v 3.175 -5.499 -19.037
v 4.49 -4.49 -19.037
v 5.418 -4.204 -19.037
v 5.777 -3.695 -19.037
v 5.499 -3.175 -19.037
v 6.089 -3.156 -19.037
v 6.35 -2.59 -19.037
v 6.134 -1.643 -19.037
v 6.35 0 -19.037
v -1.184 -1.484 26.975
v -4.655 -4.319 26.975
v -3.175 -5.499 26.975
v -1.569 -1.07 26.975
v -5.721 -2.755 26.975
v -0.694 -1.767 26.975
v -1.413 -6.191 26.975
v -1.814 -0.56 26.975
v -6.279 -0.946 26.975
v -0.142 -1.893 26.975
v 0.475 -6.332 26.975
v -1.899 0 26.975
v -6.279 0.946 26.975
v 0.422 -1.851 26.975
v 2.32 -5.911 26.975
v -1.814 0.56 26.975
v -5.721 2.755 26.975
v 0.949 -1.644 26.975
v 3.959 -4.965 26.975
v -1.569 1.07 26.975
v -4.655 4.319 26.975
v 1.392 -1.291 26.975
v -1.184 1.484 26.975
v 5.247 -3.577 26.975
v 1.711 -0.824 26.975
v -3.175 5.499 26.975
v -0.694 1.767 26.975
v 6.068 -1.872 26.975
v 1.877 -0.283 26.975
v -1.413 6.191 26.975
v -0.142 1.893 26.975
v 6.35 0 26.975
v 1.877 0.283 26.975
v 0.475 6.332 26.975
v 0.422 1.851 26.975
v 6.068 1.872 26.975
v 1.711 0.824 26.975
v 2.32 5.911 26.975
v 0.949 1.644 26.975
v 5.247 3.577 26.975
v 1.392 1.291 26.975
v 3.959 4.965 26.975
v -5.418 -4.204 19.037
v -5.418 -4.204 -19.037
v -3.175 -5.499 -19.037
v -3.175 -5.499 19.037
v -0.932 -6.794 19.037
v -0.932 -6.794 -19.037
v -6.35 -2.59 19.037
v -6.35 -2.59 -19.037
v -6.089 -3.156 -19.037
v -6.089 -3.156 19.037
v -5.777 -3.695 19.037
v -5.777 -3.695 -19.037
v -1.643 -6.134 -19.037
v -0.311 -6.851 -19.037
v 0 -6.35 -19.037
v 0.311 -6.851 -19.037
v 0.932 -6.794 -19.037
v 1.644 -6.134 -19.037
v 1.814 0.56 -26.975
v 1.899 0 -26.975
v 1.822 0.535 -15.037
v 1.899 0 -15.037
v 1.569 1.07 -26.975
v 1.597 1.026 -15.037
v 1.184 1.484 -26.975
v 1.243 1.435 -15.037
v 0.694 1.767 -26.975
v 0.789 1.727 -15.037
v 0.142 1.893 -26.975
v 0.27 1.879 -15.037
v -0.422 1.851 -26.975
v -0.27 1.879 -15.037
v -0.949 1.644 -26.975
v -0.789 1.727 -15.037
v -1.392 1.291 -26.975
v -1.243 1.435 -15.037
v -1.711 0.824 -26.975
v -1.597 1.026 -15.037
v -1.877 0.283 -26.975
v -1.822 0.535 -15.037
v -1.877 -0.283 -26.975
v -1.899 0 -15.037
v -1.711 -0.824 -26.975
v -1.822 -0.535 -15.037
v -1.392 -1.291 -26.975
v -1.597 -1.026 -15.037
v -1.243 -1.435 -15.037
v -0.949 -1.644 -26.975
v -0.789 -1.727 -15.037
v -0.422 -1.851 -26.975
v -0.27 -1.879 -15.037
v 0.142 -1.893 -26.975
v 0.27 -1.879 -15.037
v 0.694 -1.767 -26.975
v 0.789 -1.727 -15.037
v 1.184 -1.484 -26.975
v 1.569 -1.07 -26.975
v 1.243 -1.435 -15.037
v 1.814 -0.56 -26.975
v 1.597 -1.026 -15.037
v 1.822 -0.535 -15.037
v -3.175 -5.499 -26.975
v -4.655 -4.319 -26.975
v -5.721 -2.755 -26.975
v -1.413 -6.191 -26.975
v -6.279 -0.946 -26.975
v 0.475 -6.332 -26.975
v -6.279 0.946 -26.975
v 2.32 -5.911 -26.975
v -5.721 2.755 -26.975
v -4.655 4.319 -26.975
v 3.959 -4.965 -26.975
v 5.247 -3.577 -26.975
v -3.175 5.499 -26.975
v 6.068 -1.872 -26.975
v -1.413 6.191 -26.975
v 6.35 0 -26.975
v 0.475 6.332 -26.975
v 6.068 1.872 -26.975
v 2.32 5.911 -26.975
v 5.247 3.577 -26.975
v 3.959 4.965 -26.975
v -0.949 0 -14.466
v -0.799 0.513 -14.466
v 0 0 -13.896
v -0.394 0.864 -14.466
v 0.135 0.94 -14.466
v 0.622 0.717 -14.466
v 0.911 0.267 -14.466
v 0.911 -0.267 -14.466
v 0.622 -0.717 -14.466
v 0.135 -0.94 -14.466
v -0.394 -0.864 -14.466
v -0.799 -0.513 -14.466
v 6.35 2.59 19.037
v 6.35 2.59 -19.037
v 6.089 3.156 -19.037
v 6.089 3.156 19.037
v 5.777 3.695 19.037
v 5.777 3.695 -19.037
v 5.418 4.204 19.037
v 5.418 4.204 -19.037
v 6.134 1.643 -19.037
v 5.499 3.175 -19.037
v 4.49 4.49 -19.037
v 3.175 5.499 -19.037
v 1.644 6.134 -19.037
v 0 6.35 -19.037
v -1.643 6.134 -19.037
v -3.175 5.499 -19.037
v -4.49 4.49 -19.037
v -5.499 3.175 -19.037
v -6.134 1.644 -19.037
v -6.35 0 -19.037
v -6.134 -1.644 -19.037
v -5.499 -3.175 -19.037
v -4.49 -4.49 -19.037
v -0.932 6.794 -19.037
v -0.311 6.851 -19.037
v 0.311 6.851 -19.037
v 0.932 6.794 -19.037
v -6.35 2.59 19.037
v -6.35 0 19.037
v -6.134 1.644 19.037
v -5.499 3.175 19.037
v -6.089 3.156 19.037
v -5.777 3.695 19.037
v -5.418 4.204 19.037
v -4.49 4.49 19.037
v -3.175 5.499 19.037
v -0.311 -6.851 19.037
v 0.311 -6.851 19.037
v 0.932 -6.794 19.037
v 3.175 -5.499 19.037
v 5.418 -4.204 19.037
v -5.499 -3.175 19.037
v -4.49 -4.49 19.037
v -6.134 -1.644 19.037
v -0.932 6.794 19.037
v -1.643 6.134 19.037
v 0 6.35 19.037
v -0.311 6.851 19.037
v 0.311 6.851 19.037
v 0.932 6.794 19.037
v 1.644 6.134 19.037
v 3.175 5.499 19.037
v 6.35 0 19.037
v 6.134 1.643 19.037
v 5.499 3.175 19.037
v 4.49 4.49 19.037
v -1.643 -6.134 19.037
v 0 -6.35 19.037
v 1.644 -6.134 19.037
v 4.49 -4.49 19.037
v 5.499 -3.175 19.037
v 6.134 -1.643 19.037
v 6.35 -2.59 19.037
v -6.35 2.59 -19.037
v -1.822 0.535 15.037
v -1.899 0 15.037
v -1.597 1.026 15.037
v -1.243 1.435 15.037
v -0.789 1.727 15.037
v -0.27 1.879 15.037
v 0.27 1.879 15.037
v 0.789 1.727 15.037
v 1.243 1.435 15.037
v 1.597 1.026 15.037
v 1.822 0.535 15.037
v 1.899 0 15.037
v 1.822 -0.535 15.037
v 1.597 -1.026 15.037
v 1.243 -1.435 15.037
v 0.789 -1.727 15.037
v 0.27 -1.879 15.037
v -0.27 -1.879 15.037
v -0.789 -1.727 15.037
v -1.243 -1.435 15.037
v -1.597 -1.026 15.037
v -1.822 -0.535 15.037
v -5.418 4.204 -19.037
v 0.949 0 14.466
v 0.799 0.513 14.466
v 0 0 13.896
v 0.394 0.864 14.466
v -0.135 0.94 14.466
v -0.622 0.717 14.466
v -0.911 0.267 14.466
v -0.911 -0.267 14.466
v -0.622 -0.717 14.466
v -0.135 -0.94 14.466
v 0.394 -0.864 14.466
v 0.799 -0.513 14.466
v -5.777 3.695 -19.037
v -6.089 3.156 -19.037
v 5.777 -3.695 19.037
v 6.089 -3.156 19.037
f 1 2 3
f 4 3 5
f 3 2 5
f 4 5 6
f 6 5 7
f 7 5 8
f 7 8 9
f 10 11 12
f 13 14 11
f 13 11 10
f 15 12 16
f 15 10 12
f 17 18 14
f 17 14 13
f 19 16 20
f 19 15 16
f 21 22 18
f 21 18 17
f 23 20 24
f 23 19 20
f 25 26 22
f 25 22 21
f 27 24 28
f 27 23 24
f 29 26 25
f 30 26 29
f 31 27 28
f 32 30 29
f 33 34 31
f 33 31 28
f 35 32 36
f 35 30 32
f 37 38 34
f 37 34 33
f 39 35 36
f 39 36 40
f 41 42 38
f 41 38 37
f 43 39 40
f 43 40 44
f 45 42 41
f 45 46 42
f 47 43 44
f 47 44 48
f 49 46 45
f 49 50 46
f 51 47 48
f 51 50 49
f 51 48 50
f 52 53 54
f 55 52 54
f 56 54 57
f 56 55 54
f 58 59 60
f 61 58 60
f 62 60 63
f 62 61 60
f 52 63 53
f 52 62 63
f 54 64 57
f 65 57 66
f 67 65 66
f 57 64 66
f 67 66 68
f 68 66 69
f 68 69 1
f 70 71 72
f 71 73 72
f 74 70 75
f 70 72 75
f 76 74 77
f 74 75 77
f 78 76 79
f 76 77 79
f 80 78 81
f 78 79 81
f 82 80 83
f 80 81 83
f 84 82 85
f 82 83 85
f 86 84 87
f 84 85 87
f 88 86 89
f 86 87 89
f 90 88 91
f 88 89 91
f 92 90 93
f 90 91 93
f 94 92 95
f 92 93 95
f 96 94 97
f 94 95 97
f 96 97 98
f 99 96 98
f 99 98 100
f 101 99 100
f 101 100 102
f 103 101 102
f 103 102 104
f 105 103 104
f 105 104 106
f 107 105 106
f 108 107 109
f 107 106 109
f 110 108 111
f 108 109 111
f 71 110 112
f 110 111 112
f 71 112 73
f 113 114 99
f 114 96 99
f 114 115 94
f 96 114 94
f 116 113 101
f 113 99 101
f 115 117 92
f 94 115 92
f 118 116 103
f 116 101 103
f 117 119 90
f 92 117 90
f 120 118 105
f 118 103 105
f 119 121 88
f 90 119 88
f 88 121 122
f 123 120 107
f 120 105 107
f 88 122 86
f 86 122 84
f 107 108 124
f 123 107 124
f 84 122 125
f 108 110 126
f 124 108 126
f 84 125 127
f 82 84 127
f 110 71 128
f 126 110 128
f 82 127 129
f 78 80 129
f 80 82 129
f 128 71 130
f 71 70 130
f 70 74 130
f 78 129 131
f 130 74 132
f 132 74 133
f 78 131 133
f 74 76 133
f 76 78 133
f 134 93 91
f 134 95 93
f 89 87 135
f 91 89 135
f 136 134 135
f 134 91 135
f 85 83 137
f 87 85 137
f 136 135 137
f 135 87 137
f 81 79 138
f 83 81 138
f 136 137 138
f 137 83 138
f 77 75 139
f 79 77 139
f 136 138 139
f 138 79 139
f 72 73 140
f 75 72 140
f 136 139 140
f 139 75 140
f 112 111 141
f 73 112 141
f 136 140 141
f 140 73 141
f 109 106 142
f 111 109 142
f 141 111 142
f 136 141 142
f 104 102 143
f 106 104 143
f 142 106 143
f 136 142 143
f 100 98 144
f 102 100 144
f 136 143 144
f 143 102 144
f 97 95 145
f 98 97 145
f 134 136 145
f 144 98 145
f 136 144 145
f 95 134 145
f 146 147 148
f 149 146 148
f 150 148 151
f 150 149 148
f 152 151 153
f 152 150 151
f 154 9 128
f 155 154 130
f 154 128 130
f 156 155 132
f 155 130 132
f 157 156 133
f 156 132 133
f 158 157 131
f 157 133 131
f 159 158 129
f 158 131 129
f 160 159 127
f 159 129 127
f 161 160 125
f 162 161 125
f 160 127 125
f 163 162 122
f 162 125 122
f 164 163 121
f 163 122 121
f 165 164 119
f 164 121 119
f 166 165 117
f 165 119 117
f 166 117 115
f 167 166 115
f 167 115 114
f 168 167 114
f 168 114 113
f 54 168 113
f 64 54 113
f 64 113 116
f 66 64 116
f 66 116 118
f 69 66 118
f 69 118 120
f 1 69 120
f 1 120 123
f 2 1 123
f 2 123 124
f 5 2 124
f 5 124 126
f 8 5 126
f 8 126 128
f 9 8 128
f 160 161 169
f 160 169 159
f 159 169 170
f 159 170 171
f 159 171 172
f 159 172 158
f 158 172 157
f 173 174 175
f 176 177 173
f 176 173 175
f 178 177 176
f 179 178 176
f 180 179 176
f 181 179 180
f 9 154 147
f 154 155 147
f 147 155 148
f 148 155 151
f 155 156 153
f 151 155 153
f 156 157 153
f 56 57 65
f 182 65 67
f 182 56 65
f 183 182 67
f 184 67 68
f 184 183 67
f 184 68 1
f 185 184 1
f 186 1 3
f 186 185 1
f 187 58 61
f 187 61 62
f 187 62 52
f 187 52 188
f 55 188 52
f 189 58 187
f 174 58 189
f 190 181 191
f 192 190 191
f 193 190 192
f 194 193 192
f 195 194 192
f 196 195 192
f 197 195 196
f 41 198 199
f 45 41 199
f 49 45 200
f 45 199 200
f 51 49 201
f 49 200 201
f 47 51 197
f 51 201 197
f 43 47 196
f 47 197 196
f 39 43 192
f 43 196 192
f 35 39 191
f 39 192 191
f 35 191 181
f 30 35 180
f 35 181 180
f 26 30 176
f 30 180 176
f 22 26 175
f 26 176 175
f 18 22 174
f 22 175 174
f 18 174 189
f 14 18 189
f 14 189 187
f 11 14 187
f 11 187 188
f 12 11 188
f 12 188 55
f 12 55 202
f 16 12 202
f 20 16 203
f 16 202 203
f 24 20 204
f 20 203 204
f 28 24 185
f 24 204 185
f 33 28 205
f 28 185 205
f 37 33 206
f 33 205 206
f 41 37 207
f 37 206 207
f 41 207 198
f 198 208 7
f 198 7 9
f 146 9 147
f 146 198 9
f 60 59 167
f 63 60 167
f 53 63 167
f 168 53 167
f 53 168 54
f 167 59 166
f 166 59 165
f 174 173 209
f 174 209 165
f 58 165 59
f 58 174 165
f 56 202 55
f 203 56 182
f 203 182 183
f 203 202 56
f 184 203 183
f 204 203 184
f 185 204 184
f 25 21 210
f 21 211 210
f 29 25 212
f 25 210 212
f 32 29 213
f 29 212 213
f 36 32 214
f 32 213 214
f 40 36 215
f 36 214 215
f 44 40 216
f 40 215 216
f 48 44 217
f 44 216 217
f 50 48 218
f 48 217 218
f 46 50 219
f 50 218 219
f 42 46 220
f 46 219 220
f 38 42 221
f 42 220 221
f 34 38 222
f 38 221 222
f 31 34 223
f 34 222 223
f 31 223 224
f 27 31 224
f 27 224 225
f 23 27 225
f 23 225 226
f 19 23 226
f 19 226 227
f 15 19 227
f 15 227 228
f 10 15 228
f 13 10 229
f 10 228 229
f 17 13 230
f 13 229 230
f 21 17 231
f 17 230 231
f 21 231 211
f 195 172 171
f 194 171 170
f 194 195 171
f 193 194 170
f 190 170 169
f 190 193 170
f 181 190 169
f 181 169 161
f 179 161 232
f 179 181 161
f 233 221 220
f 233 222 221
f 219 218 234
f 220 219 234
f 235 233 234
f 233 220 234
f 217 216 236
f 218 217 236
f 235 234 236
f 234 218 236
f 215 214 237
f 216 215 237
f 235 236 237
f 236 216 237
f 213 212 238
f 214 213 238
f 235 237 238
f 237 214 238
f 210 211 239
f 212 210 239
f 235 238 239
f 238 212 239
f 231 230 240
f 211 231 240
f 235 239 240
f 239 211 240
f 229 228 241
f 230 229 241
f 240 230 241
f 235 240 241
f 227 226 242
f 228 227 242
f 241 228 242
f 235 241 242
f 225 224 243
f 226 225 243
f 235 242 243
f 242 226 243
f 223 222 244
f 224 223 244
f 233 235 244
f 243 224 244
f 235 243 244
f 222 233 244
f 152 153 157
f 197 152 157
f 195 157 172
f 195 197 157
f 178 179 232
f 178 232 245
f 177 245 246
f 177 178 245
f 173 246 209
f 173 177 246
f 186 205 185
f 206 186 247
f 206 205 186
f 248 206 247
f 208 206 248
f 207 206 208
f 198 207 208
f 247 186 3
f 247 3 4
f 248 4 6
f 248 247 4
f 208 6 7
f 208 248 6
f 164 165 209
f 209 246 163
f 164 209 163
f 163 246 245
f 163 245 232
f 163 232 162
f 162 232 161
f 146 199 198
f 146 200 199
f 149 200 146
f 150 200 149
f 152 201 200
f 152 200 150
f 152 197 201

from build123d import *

# Parameters (mm, degrees)
BOSS_EXTRUDE1_DEPTH                  = 26.9748
CUT_EXTRUDE_THIN1_DEPTH              = 29.548108502
CUT_EXTRUDE_THIN1_DEPTH_BACK         = 7.9375
CUT_EXTRUDE_THIN1_START              = 26.9748
SKETCH2_R                            = 8.89
SKETCH2_R_2                          = 6.35
CUT_EXTRUDE_THIN2_START              = -26.9748
SKETCH2_2_R                          = 8.89
SKETCH2_2_R_2                        = 6.35
CUT_EXTRUDE_THIN2_DEPTH              = 7.9375
F_10_24_TAPPED_HOLE1_D               = 3.7973
F_10_24_TAPPED_HOLE1_DEPTH           = 11.938
F_10_24_TAPPED_HOLE1_TIP             = 1.140824014
F_10_24_TAPPED_HOLE1_ON_FACE_2_D     = 3.7973
F_10_24_TAPPED_HOLE1_ON_FACE_2_DEPTH = 11.938
F_10_24_TAPPED_HOLE1_ON_FACE_2_TIP   = 1.140824014


with BuildPart() as part:
    # Sketch1 → Boss-Extrude1 (new, symmetric)
    with BuildSketch(Plane.XY):
        with BuildLine():
            ThreePointArc((0.93173274, 6.79441227), (0, 6.858), (-0.93173274, 6.79441227))
            Line((-0.93173274, 6.79441227), (-5.41826726, 4.204110358))
            ThreePointArc((-5.41826726, 4.204110358), (-5.939202219, 3.429), (-6.35, 2.590301913))
            Line((-6.35, 2.590301913), (-6.35, -2.590301913))
            ThreePointArc((-6.35, -2.590301913), (-5.939202219, -3.429), (-5.41826726, -4.204110358))
            Line((-5.41826726, -4.204110358), (-0.93173274, -6.79441227))
            ThreePointArc((-0.93173274, -6.79441227), (0, -6.858), (0.93173274, -6.79441227))
            Line((0.93173274, -6.79441227), (5.41826726, -4.204110358))
            ThreePointArc((5.41826726, -4.204110358), (5.939202219, -3.429), (6.35, -2.590301913))
            Line((6.35, -2.590301913), (6.35, 2.590301913))
            ThreePointArc((6.35, 2.590301913), (5.939202219, 3.429), (5.41826726, 4.204110358))
            Line((5.41826726, 4.204110358), (0.93173274, 6.79441227))
        make_face()
    extrude(amount=BOSS_EXTRUDE1_DEPTH, both=True)

    # Sketch2 → Cut-Extrude-Thin1 (cut, two sides: drawn at the far end of the back side and taken through both)
    with BuildSketch(Plane.XY.offset(CUT_EXTRUDE_THIN1_START - CUT_EXTRUDE_THIN1_DEPTH_BACK)):
        Circle(SKETCH2_R)
        Circle(SKETCH2_R_2, mode=Mode.SUBTRACT)
    extrude(amount=CUT_EXTRUDE_THIN1_DEPTH + CUT_EXTRUDE_THIN1_DEPTH_BACK, mode=Mode.SUBTRACT)

    # Sketch2<2> → Cut-Extrude-Thin2 (cut)
    with BuildSketch(Plane.XY.offset(CUT_EXTRUDE_THIN2_START)):
        Circle(SKETCH2_2_R)
        Circle(SKETCH2_2_R_2, mode=Mode.SUBTRACT)
    extrude(amount=CUT_EXTRUDE_THIN2_DEPTH, mode=Mode.SUBTRACT)

    # #10-24 Tapped Hole1
    with Locations(Plane.XY.offset(26.9748)):
        with Locations((0, 0)):
            Hole(F_10_24_TAPPED_HOLE1_D / 2, depth=F_10_24_TAPPED_HOLE1_DEPTH)
            with Locations((0, 0, -(F_10_24_TAPPED_HOLE1_DEPTH + F_10_24_TAPPED_HOLE1_TIP / 2))):  # 118° drill point
                Cone(0, F_10_24_TAPPED_HOLE1_D / 2, F_10_24_TAPPED_HOLE1_TIP, mode=Mode.SUBTRACT)

    # #10-24 Tapped Hole1 on face 2
    with Locations(Plane(origin=(0, 0, -26.9748), x_dir=(-1, 0, 0), z_dir=(0, 0, -1))):
        with Locations((0, 0)):
            Hole(F_10_24_TAPPED_HOLE1_ON_FACE_2_D / 2, depth=F_10_24_TAPPED_HOLE1_ON_FACE_2_DEPTH)
            with Locations((0, 0, -(F_10_24_TAPPED_HOLE1_ON_FACE_2_DEPTH + F_10_24_TAPPED_HOLE1_ON_FACE_2_TIP / 2))):  # 118° drill point
                Cone(0, F_10_24_TAPPED_HOLE1_ON_FACE_2_D / 2, F_10_24_TAPPED_HOLE1_ON_FACE_2_TIP, mode=Mode.SUBTRACT)


solid = part.part
